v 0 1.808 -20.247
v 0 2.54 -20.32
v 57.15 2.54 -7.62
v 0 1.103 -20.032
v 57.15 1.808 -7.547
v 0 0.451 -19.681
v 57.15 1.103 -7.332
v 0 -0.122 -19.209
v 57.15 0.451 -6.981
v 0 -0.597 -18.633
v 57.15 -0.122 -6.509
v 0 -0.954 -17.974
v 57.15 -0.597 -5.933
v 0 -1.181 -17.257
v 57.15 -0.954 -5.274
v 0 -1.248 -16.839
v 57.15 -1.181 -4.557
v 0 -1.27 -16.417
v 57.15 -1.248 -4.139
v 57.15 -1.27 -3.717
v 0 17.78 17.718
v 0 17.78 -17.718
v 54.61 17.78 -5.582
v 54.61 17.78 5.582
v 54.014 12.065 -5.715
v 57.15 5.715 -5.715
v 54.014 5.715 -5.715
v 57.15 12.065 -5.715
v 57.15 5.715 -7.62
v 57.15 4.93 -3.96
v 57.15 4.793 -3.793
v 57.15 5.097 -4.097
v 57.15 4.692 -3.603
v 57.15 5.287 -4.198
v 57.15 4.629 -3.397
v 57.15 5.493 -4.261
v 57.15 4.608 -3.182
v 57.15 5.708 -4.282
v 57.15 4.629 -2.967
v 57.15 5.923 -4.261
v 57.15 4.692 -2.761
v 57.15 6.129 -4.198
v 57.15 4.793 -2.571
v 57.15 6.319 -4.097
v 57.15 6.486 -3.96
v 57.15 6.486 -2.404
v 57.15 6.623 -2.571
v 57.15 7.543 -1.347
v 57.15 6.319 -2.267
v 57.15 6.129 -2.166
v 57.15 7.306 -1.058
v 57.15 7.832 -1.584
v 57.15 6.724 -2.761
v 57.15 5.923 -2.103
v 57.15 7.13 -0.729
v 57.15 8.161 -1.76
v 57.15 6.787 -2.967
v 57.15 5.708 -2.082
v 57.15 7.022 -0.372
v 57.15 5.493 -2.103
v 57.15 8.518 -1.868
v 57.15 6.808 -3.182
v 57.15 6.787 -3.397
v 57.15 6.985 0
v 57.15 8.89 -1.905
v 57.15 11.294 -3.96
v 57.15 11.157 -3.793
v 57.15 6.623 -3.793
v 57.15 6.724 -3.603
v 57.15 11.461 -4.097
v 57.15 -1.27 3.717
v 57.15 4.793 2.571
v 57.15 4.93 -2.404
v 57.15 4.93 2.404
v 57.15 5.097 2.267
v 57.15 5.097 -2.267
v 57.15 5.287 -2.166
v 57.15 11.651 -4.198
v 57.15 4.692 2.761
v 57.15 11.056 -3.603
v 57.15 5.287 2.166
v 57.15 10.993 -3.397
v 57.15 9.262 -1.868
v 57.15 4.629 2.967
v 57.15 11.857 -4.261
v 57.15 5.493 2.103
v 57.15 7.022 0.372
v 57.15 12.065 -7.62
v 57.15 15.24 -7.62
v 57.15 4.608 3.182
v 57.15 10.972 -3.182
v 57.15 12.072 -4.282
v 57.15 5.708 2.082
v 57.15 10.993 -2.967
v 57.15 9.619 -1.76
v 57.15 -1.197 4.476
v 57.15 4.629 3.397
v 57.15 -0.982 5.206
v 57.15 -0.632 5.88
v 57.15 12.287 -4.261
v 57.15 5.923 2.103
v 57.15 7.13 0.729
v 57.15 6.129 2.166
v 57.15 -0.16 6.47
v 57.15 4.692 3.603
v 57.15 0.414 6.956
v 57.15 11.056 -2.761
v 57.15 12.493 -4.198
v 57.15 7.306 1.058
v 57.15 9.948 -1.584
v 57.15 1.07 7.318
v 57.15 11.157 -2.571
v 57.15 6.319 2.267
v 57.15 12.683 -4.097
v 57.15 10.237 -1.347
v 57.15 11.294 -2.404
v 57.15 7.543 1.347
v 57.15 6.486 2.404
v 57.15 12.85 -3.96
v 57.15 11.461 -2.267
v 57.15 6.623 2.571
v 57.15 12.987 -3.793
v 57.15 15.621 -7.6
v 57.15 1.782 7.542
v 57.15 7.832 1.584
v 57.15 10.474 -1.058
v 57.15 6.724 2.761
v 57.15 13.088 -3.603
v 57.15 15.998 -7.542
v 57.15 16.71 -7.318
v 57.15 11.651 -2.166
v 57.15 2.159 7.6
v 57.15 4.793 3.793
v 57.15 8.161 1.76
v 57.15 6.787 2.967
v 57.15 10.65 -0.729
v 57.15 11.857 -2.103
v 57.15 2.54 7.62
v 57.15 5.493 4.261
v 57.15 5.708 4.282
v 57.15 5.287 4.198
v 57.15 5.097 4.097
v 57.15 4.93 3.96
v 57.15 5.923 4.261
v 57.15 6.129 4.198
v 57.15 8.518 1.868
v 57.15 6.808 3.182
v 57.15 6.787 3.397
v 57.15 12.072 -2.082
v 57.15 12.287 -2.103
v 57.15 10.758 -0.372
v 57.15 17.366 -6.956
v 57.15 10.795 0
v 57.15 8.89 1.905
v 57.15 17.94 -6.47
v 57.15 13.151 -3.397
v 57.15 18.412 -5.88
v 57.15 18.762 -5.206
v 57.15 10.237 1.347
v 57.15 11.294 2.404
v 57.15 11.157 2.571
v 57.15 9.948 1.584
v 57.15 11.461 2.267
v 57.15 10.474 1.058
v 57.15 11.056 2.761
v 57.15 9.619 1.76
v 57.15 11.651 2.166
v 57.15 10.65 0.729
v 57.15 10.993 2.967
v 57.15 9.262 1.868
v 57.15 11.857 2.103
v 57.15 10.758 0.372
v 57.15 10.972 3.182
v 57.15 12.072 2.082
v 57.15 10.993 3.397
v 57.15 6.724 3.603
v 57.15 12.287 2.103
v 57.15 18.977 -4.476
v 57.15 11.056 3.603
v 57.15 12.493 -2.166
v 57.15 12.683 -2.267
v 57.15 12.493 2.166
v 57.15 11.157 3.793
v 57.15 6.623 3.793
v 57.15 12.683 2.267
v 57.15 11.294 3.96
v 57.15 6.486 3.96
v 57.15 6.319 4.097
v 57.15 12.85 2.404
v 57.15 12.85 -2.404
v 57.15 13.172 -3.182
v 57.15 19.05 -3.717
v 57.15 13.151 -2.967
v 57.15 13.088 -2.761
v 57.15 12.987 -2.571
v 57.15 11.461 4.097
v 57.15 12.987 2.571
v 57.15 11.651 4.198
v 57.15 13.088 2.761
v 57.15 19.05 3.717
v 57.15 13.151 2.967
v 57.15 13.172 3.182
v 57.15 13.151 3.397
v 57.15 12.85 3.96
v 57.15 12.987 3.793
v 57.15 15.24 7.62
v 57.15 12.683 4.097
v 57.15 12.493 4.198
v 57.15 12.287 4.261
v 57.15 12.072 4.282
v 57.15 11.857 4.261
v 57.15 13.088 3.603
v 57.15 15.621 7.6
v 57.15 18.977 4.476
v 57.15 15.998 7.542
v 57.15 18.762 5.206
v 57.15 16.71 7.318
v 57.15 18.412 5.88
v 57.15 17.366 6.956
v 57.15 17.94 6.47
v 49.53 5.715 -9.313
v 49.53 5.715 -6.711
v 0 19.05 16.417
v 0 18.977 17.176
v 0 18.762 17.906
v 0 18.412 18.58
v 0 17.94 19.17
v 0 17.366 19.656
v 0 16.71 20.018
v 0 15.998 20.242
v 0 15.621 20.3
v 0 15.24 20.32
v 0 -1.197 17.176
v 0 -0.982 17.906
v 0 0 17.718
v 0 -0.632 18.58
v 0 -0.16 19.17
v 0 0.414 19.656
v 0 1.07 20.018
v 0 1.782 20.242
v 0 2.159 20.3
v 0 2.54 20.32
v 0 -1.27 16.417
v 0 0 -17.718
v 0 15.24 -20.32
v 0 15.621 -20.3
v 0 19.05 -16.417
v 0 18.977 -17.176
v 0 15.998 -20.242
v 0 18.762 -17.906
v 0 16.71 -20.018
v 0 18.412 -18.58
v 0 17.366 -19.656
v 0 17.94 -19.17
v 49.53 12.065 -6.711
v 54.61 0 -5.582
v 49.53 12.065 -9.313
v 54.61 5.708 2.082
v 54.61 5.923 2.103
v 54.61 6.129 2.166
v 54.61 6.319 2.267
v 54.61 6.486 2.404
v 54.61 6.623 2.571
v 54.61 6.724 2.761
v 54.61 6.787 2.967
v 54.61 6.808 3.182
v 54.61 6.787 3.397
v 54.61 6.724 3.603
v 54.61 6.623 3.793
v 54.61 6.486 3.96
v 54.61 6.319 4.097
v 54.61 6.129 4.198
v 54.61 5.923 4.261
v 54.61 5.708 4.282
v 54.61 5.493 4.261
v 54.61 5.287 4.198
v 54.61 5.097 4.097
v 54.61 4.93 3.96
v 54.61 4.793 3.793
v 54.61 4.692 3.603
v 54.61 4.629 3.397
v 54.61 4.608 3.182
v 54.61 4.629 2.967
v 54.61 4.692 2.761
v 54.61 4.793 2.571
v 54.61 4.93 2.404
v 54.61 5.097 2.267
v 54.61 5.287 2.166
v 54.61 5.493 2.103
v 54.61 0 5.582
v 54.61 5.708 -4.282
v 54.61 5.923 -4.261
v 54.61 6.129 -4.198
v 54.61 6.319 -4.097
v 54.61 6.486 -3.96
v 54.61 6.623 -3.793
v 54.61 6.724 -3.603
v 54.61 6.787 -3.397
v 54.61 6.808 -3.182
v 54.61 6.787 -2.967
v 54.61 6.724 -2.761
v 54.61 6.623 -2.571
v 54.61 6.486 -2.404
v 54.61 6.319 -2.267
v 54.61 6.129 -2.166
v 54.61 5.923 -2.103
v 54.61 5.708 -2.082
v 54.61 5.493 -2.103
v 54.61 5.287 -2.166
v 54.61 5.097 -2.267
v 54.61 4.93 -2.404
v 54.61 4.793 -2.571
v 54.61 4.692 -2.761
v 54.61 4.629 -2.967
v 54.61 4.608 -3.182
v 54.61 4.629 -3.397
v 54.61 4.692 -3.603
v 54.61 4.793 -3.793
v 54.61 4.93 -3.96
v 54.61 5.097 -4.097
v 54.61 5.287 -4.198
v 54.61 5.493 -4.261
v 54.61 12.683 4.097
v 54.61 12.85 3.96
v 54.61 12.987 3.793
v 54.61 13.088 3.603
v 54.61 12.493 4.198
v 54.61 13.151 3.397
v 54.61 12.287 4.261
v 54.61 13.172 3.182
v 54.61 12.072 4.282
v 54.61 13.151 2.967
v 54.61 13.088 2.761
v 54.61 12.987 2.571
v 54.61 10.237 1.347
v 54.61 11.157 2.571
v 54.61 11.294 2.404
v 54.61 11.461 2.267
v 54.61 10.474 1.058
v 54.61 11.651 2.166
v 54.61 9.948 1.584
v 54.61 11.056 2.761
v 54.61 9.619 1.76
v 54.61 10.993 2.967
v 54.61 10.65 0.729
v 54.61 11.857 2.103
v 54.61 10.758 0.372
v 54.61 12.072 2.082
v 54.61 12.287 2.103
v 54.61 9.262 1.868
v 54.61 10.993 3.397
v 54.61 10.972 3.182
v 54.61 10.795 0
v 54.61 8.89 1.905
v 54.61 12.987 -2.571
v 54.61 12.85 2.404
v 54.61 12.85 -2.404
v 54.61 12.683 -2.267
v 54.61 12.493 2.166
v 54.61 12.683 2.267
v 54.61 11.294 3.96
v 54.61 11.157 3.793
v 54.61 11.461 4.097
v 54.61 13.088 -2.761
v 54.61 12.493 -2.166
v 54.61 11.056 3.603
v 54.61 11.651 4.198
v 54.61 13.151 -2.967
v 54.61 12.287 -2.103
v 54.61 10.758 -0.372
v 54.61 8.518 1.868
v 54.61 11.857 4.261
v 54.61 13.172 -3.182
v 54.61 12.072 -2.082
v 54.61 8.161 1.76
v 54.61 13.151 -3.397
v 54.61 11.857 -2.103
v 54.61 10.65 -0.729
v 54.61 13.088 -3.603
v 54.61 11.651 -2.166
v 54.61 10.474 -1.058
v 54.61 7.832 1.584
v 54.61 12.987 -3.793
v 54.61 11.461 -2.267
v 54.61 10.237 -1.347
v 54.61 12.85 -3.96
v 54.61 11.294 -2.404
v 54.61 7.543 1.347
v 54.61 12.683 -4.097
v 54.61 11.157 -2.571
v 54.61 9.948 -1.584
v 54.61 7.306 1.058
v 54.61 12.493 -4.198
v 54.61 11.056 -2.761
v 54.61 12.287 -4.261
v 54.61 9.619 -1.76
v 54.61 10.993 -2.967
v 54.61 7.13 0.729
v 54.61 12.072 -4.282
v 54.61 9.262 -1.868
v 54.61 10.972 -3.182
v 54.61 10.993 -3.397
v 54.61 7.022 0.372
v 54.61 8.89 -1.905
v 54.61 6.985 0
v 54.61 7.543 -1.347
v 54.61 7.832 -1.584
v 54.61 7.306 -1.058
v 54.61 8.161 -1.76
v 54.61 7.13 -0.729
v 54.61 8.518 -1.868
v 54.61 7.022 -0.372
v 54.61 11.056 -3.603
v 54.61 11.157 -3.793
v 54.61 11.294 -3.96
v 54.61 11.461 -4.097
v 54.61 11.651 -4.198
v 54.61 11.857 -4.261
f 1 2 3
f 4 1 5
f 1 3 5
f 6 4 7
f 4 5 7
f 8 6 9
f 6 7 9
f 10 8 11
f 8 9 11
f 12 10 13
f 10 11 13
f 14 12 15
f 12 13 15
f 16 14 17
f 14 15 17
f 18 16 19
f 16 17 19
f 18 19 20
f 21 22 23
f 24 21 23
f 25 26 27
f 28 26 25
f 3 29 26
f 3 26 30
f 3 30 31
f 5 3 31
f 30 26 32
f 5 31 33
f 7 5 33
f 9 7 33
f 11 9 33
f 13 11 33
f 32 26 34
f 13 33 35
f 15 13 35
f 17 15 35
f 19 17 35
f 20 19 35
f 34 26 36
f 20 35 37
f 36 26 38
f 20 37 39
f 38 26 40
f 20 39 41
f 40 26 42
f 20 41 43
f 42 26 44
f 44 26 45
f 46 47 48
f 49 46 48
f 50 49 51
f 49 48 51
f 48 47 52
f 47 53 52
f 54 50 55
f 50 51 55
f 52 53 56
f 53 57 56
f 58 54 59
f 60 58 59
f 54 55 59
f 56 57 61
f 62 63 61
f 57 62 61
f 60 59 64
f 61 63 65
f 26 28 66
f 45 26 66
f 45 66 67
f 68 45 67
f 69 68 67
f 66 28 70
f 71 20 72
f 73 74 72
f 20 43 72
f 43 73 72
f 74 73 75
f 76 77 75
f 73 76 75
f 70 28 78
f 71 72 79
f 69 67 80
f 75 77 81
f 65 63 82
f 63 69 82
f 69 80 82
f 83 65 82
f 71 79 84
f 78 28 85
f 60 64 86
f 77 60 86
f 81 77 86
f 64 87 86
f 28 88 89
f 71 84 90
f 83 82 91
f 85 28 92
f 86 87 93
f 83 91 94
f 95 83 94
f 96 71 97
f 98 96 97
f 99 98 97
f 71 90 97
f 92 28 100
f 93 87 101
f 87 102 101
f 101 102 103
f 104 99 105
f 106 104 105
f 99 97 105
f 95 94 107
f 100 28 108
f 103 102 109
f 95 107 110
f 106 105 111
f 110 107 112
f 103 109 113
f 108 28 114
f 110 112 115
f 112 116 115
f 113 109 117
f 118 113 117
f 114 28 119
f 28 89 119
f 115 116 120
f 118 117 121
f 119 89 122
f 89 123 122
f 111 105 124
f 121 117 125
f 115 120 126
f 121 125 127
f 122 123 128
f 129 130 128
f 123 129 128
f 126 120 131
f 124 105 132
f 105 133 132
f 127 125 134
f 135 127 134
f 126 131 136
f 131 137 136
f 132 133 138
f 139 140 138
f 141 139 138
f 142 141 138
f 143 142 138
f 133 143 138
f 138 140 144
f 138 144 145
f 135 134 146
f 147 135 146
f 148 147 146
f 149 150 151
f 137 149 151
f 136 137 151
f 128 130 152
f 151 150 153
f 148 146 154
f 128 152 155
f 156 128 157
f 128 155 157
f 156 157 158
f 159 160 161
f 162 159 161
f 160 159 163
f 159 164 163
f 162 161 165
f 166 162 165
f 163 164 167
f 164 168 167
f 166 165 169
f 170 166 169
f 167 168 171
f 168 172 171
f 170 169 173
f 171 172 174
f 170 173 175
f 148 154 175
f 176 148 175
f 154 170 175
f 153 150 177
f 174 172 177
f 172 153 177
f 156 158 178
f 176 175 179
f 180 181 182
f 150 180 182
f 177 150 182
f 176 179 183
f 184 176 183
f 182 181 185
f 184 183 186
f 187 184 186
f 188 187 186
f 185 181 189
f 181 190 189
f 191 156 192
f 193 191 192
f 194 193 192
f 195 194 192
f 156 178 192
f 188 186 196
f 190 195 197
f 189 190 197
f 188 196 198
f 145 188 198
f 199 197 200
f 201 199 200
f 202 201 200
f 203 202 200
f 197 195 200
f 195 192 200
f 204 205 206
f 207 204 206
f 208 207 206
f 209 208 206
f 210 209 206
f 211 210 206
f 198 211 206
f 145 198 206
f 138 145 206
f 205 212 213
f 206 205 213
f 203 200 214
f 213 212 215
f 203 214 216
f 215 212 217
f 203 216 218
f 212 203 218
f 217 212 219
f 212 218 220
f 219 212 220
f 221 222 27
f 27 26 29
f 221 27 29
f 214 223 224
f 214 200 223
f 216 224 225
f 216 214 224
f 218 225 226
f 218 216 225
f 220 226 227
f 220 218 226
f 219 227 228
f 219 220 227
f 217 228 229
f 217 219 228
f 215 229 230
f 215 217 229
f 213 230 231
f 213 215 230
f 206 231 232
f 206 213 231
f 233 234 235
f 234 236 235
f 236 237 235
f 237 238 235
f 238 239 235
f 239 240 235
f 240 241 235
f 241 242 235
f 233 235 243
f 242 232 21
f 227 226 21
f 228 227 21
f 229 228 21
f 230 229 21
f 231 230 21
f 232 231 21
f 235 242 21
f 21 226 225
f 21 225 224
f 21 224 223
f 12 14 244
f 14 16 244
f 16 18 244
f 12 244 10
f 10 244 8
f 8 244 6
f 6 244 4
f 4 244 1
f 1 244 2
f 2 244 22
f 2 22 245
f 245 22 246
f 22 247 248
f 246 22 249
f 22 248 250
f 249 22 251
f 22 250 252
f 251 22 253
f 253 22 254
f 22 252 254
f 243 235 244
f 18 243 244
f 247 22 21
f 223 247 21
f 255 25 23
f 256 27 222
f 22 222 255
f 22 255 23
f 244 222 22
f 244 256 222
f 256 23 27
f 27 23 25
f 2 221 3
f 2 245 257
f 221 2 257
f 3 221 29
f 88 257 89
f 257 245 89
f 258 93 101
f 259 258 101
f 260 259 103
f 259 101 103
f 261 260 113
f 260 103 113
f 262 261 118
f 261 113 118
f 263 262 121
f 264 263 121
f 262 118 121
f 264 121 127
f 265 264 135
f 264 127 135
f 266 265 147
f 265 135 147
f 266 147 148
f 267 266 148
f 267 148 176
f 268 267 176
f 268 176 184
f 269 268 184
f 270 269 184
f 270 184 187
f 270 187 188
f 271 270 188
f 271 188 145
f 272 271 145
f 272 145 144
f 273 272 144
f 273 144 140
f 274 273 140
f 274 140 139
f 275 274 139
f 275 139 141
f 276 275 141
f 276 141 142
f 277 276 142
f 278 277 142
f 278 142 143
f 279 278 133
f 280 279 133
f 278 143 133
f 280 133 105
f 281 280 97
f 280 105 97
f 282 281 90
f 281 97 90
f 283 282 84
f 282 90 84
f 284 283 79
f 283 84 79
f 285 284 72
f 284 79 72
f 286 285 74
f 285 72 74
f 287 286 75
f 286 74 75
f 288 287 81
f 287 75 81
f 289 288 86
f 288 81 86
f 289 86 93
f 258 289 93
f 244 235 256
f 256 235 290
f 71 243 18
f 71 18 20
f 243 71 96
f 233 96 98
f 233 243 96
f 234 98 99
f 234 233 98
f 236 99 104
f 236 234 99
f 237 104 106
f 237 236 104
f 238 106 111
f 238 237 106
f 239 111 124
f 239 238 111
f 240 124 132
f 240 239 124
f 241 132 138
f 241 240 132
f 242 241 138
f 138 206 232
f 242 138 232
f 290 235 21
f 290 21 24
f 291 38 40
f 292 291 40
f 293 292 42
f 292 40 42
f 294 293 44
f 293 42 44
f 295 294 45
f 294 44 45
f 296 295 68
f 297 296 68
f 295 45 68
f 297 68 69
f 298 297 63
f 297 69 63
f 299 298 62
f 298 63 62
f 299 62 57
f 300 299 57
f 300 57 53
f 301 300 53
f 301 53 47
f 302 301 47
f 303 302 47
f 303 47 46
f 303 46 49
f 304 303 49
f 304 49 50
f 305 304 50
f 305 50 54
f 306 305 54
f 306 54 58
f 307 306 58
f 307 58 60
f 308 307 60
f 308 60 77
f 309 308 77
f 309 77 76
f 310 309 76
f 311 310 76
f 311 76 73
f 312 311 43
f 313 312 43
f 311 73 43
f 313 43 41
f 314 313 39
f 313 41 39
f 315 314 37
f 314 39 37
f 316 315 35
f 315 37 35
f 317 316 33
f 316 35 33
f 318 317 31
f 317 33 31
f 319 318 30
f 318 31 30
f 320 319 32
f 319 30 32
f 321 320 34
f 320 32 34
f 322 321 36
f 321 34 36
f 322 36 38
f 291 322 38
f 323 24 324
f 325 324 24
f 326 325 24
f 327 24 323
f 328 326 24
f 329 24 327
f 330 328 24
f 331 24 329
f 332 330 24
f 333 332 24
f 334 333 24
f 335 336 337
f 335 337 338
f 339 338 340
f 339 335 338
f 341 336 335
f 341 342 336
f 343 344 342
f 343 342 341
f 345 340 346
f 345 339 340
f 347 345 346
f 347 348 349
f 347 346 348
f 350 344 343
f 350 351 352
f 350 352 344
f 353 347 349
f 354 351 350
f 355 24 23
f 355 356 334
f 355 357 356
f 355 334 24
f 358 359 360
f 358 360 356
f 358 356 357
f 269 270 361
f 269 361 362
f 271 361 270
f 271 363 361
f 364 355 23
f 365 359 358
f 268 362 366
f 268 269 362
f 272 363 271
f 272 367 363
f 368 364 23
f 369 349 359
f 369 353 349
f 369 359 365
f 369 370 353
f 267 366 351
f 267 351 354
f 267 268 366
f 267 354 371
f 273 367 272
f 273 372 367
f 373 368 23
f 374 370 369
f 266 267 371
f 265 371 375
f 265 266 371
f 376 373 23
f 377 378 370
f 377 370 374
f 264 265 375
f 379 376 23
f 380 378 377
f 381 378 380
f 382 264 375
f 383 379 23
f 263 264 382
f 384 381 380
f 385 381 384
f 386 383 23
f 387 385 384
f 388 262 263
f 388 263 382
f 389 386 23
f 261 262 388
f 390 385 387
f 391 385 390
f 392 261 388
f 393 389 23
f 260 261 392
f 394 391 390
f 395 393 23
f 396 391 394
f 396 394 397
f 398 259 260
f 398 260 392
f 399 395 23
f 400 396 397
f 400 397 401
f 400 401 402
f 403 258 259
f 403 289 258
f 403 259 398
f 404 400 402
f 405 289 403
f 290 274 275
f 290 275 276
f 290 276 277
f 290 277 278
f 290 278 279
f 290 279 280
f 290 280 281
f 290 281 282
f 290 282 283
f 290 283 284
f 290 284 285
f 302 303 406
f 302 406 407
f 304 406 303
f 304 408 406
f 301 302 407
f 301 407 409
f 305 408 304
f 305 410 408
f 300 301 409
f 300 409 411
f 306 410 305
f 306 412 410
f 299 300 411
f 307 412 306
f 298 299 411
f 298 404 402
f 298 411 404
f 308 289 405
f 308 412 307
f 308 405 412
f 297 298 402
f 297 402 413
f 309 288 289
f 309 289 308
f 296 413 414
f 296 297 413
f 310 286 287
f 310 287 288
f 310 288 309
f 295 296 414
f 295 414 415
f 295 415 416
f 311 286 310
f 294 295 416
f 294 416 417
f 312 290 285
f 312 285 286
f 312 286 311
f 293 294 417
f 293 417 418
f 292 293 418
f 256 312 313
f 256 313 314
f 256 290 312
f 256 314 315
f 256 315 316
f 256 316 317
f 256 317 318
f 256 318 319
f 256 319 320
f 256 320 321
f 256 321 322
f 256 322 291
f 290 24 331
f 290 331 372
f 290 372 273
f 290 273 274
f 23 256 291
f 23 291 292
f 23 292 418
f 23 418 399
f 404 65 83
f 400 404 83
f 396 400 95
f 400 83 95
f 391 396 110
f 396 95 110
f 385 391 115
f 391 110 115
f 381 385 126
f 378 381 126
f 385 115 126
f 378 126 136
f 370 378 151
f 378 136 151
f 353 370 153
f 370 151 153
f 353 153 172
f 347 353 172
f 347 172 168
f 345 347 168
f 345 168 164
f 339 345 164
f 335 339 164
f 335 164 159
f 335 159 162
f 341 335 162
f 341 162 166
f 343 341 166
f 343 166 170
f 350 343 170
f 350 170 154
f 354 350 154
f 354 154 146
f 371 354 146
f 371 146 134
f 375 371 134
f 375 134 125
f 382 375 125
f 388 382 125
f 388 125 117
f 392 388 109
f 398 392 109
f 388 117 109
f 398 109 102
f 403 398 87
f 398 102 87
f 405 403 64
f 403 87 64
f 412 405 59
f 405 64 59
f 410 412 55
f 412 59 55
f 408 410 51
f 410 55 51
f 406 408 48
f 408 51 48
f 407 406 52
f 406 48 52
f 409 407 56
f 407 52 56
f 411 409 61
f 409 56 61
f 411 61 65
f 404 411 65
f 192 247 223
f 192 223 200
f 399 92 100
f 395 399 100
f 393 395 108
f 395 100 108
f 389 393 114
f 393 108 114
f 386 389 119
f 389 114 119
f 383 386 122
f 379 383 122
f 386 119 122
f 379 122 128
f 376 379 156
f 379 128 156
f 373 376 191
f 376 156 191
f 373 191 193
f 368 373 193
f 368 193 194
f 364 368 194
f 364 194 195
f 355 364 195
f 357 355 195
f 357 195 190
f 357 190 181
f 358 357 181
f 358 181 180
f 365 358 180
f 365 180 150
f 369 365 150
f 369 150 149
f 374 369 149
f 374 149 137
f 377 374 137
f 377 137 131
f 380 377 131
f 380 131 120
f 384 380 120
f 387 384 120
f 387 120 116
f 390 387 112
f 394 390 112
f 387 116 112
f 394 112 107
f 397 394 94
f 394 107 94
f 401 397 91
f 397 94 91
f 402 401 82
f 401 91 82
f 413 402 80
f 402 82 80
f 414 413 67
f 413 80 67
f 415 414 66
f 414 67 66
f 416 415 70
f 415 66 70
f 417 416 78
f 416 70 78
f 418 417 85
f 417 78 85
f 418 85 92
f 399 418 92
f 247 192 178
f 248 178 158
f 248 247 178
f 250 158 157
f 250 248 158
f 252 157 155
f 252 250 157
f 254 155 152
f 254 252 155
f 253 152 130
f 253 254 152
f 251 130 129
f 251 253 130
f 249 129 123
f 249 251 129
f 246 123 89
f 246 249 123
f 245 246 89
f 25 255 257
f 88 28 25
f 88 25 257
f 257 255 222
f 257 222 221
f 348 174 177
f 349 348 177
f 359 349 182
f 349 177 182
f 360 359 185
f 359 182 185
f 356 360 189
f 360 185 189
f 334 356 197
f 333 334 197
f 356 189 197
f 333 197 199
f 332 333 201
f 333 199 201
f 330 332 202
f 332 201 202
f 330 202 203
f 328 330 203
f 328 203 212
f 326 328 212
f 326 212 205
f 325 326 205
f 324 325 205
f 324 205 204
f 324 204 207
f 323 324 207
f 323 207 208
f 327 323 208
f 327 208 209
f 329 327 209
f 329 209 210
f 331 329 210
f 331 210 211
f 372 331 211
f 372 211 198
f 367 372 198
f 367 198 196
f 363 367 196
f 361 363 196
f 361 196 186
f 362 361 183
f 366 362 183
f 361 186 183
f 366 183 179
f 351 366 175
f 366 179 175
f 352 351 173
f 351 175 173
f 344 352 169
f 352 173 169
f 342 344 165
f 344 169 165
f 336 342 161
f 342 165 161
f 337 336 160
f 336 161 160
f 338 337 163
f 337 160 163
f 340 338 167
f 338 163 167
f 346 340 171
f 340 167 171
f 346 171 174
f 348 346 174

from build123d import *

# Parameters (mm, degrees)
BOSS_EXTRUDE1_DEPTH = 17.78
SKETCH4_R           = 1.905
SKETCH4_R_2         = 1.1
SKETCH4_W           = 3.81
SKETCH4_H           = 6.35
CUT_EXTRUDE1_DEPTH  = 7.62
BOSS_EXTRUDE2_DEPTH = 1.27
BOSS_EXTRUDE3_DEPTH = 1.27
FILLET1_R           = 3.81


with BuildPart() as part:
    # Sketch3 → Boss-Extrude1 (new body)
    with BuildSketch(Plane(origin=(0, 0, 0), x_dir=(1, 0, 0), z_dir=(0, 1, 0))):
        Polygon((0, 20.32), (57.15, 7.62), (57.15, -7.62), (0, -20.32), (0, -17.718039675), (54.61, -5.58248412), (54.61, 5.58248412), (0, 17.718039675), align=None)
    extrude(amount=BOSS_EXTRUDE1_DEPTH)

    # Sketch4 → Cut-Extrude1 (cut)
    with BuildSketch(Plane(origin=(57.15, 0, 0), x_dir=(0, 0, -1), z_dir=(1, 0, 0))):
        with Locations((0, 8.89)):
            Circle(SKETCH4_R)
        with Locations((-3.181980515, 12.071980515)):
            Circle(SKETCH4_R_2)
        with Locations((3.181980515, 12.071980515)):
            Circle(SKETCH4_R_2)
        with Locations((3.181980515, 5.708019485)):
            Circle(SKETCH4_R_2)
        with Locations((-3.181980515, 5.708019485)):
            Circle(SKETCH4_R_2)
        with Locations((7.62, 8.89)):
            Rectangle(SKETCH4_W, SKETCH4_H)
    extrude(amount=-CUT_EXTRUDE1_DEPTH, mode=Mode.SUBTRACT)

    # Sketch5 → Boss-Extrude2 (add)
    with BuildSketch(Plane(origin=(0, 17.78, 0), x_dir=(1, 0, 0), z_dir=(0, 1, 0))):
        Polygon((0, 20.32), (0, -20.32), (57.15, -7.62), (57.15, 7.62), align=None)
    extrude(amount=BOSS_EXTRUDE2_DEPTH)

    # Sketch6 → Boss-Extrude3 (add)
    with BuildSketch(Plane.XZ):
        Polygon((0, 20.32), (0, -20.32), (57.15, -7.62), (57.15, 7.62), align=None)
    extrude(amount=BOSS_EXTRUDE3_DEPTH)

    # Fillet1
    fillet1_edges = [part.edges().sort_by_distance(p)[0] for p in [
        (28.575, 19.05, -13.97),
        (28.575, 19.05, 13.97),
        (28.575, -1.27, 13.97),
        (28.575, -1.27, -13.97),
    ]]
    fillet(fillet1_edges, radius=FILLET1_R)


solid = part.part
